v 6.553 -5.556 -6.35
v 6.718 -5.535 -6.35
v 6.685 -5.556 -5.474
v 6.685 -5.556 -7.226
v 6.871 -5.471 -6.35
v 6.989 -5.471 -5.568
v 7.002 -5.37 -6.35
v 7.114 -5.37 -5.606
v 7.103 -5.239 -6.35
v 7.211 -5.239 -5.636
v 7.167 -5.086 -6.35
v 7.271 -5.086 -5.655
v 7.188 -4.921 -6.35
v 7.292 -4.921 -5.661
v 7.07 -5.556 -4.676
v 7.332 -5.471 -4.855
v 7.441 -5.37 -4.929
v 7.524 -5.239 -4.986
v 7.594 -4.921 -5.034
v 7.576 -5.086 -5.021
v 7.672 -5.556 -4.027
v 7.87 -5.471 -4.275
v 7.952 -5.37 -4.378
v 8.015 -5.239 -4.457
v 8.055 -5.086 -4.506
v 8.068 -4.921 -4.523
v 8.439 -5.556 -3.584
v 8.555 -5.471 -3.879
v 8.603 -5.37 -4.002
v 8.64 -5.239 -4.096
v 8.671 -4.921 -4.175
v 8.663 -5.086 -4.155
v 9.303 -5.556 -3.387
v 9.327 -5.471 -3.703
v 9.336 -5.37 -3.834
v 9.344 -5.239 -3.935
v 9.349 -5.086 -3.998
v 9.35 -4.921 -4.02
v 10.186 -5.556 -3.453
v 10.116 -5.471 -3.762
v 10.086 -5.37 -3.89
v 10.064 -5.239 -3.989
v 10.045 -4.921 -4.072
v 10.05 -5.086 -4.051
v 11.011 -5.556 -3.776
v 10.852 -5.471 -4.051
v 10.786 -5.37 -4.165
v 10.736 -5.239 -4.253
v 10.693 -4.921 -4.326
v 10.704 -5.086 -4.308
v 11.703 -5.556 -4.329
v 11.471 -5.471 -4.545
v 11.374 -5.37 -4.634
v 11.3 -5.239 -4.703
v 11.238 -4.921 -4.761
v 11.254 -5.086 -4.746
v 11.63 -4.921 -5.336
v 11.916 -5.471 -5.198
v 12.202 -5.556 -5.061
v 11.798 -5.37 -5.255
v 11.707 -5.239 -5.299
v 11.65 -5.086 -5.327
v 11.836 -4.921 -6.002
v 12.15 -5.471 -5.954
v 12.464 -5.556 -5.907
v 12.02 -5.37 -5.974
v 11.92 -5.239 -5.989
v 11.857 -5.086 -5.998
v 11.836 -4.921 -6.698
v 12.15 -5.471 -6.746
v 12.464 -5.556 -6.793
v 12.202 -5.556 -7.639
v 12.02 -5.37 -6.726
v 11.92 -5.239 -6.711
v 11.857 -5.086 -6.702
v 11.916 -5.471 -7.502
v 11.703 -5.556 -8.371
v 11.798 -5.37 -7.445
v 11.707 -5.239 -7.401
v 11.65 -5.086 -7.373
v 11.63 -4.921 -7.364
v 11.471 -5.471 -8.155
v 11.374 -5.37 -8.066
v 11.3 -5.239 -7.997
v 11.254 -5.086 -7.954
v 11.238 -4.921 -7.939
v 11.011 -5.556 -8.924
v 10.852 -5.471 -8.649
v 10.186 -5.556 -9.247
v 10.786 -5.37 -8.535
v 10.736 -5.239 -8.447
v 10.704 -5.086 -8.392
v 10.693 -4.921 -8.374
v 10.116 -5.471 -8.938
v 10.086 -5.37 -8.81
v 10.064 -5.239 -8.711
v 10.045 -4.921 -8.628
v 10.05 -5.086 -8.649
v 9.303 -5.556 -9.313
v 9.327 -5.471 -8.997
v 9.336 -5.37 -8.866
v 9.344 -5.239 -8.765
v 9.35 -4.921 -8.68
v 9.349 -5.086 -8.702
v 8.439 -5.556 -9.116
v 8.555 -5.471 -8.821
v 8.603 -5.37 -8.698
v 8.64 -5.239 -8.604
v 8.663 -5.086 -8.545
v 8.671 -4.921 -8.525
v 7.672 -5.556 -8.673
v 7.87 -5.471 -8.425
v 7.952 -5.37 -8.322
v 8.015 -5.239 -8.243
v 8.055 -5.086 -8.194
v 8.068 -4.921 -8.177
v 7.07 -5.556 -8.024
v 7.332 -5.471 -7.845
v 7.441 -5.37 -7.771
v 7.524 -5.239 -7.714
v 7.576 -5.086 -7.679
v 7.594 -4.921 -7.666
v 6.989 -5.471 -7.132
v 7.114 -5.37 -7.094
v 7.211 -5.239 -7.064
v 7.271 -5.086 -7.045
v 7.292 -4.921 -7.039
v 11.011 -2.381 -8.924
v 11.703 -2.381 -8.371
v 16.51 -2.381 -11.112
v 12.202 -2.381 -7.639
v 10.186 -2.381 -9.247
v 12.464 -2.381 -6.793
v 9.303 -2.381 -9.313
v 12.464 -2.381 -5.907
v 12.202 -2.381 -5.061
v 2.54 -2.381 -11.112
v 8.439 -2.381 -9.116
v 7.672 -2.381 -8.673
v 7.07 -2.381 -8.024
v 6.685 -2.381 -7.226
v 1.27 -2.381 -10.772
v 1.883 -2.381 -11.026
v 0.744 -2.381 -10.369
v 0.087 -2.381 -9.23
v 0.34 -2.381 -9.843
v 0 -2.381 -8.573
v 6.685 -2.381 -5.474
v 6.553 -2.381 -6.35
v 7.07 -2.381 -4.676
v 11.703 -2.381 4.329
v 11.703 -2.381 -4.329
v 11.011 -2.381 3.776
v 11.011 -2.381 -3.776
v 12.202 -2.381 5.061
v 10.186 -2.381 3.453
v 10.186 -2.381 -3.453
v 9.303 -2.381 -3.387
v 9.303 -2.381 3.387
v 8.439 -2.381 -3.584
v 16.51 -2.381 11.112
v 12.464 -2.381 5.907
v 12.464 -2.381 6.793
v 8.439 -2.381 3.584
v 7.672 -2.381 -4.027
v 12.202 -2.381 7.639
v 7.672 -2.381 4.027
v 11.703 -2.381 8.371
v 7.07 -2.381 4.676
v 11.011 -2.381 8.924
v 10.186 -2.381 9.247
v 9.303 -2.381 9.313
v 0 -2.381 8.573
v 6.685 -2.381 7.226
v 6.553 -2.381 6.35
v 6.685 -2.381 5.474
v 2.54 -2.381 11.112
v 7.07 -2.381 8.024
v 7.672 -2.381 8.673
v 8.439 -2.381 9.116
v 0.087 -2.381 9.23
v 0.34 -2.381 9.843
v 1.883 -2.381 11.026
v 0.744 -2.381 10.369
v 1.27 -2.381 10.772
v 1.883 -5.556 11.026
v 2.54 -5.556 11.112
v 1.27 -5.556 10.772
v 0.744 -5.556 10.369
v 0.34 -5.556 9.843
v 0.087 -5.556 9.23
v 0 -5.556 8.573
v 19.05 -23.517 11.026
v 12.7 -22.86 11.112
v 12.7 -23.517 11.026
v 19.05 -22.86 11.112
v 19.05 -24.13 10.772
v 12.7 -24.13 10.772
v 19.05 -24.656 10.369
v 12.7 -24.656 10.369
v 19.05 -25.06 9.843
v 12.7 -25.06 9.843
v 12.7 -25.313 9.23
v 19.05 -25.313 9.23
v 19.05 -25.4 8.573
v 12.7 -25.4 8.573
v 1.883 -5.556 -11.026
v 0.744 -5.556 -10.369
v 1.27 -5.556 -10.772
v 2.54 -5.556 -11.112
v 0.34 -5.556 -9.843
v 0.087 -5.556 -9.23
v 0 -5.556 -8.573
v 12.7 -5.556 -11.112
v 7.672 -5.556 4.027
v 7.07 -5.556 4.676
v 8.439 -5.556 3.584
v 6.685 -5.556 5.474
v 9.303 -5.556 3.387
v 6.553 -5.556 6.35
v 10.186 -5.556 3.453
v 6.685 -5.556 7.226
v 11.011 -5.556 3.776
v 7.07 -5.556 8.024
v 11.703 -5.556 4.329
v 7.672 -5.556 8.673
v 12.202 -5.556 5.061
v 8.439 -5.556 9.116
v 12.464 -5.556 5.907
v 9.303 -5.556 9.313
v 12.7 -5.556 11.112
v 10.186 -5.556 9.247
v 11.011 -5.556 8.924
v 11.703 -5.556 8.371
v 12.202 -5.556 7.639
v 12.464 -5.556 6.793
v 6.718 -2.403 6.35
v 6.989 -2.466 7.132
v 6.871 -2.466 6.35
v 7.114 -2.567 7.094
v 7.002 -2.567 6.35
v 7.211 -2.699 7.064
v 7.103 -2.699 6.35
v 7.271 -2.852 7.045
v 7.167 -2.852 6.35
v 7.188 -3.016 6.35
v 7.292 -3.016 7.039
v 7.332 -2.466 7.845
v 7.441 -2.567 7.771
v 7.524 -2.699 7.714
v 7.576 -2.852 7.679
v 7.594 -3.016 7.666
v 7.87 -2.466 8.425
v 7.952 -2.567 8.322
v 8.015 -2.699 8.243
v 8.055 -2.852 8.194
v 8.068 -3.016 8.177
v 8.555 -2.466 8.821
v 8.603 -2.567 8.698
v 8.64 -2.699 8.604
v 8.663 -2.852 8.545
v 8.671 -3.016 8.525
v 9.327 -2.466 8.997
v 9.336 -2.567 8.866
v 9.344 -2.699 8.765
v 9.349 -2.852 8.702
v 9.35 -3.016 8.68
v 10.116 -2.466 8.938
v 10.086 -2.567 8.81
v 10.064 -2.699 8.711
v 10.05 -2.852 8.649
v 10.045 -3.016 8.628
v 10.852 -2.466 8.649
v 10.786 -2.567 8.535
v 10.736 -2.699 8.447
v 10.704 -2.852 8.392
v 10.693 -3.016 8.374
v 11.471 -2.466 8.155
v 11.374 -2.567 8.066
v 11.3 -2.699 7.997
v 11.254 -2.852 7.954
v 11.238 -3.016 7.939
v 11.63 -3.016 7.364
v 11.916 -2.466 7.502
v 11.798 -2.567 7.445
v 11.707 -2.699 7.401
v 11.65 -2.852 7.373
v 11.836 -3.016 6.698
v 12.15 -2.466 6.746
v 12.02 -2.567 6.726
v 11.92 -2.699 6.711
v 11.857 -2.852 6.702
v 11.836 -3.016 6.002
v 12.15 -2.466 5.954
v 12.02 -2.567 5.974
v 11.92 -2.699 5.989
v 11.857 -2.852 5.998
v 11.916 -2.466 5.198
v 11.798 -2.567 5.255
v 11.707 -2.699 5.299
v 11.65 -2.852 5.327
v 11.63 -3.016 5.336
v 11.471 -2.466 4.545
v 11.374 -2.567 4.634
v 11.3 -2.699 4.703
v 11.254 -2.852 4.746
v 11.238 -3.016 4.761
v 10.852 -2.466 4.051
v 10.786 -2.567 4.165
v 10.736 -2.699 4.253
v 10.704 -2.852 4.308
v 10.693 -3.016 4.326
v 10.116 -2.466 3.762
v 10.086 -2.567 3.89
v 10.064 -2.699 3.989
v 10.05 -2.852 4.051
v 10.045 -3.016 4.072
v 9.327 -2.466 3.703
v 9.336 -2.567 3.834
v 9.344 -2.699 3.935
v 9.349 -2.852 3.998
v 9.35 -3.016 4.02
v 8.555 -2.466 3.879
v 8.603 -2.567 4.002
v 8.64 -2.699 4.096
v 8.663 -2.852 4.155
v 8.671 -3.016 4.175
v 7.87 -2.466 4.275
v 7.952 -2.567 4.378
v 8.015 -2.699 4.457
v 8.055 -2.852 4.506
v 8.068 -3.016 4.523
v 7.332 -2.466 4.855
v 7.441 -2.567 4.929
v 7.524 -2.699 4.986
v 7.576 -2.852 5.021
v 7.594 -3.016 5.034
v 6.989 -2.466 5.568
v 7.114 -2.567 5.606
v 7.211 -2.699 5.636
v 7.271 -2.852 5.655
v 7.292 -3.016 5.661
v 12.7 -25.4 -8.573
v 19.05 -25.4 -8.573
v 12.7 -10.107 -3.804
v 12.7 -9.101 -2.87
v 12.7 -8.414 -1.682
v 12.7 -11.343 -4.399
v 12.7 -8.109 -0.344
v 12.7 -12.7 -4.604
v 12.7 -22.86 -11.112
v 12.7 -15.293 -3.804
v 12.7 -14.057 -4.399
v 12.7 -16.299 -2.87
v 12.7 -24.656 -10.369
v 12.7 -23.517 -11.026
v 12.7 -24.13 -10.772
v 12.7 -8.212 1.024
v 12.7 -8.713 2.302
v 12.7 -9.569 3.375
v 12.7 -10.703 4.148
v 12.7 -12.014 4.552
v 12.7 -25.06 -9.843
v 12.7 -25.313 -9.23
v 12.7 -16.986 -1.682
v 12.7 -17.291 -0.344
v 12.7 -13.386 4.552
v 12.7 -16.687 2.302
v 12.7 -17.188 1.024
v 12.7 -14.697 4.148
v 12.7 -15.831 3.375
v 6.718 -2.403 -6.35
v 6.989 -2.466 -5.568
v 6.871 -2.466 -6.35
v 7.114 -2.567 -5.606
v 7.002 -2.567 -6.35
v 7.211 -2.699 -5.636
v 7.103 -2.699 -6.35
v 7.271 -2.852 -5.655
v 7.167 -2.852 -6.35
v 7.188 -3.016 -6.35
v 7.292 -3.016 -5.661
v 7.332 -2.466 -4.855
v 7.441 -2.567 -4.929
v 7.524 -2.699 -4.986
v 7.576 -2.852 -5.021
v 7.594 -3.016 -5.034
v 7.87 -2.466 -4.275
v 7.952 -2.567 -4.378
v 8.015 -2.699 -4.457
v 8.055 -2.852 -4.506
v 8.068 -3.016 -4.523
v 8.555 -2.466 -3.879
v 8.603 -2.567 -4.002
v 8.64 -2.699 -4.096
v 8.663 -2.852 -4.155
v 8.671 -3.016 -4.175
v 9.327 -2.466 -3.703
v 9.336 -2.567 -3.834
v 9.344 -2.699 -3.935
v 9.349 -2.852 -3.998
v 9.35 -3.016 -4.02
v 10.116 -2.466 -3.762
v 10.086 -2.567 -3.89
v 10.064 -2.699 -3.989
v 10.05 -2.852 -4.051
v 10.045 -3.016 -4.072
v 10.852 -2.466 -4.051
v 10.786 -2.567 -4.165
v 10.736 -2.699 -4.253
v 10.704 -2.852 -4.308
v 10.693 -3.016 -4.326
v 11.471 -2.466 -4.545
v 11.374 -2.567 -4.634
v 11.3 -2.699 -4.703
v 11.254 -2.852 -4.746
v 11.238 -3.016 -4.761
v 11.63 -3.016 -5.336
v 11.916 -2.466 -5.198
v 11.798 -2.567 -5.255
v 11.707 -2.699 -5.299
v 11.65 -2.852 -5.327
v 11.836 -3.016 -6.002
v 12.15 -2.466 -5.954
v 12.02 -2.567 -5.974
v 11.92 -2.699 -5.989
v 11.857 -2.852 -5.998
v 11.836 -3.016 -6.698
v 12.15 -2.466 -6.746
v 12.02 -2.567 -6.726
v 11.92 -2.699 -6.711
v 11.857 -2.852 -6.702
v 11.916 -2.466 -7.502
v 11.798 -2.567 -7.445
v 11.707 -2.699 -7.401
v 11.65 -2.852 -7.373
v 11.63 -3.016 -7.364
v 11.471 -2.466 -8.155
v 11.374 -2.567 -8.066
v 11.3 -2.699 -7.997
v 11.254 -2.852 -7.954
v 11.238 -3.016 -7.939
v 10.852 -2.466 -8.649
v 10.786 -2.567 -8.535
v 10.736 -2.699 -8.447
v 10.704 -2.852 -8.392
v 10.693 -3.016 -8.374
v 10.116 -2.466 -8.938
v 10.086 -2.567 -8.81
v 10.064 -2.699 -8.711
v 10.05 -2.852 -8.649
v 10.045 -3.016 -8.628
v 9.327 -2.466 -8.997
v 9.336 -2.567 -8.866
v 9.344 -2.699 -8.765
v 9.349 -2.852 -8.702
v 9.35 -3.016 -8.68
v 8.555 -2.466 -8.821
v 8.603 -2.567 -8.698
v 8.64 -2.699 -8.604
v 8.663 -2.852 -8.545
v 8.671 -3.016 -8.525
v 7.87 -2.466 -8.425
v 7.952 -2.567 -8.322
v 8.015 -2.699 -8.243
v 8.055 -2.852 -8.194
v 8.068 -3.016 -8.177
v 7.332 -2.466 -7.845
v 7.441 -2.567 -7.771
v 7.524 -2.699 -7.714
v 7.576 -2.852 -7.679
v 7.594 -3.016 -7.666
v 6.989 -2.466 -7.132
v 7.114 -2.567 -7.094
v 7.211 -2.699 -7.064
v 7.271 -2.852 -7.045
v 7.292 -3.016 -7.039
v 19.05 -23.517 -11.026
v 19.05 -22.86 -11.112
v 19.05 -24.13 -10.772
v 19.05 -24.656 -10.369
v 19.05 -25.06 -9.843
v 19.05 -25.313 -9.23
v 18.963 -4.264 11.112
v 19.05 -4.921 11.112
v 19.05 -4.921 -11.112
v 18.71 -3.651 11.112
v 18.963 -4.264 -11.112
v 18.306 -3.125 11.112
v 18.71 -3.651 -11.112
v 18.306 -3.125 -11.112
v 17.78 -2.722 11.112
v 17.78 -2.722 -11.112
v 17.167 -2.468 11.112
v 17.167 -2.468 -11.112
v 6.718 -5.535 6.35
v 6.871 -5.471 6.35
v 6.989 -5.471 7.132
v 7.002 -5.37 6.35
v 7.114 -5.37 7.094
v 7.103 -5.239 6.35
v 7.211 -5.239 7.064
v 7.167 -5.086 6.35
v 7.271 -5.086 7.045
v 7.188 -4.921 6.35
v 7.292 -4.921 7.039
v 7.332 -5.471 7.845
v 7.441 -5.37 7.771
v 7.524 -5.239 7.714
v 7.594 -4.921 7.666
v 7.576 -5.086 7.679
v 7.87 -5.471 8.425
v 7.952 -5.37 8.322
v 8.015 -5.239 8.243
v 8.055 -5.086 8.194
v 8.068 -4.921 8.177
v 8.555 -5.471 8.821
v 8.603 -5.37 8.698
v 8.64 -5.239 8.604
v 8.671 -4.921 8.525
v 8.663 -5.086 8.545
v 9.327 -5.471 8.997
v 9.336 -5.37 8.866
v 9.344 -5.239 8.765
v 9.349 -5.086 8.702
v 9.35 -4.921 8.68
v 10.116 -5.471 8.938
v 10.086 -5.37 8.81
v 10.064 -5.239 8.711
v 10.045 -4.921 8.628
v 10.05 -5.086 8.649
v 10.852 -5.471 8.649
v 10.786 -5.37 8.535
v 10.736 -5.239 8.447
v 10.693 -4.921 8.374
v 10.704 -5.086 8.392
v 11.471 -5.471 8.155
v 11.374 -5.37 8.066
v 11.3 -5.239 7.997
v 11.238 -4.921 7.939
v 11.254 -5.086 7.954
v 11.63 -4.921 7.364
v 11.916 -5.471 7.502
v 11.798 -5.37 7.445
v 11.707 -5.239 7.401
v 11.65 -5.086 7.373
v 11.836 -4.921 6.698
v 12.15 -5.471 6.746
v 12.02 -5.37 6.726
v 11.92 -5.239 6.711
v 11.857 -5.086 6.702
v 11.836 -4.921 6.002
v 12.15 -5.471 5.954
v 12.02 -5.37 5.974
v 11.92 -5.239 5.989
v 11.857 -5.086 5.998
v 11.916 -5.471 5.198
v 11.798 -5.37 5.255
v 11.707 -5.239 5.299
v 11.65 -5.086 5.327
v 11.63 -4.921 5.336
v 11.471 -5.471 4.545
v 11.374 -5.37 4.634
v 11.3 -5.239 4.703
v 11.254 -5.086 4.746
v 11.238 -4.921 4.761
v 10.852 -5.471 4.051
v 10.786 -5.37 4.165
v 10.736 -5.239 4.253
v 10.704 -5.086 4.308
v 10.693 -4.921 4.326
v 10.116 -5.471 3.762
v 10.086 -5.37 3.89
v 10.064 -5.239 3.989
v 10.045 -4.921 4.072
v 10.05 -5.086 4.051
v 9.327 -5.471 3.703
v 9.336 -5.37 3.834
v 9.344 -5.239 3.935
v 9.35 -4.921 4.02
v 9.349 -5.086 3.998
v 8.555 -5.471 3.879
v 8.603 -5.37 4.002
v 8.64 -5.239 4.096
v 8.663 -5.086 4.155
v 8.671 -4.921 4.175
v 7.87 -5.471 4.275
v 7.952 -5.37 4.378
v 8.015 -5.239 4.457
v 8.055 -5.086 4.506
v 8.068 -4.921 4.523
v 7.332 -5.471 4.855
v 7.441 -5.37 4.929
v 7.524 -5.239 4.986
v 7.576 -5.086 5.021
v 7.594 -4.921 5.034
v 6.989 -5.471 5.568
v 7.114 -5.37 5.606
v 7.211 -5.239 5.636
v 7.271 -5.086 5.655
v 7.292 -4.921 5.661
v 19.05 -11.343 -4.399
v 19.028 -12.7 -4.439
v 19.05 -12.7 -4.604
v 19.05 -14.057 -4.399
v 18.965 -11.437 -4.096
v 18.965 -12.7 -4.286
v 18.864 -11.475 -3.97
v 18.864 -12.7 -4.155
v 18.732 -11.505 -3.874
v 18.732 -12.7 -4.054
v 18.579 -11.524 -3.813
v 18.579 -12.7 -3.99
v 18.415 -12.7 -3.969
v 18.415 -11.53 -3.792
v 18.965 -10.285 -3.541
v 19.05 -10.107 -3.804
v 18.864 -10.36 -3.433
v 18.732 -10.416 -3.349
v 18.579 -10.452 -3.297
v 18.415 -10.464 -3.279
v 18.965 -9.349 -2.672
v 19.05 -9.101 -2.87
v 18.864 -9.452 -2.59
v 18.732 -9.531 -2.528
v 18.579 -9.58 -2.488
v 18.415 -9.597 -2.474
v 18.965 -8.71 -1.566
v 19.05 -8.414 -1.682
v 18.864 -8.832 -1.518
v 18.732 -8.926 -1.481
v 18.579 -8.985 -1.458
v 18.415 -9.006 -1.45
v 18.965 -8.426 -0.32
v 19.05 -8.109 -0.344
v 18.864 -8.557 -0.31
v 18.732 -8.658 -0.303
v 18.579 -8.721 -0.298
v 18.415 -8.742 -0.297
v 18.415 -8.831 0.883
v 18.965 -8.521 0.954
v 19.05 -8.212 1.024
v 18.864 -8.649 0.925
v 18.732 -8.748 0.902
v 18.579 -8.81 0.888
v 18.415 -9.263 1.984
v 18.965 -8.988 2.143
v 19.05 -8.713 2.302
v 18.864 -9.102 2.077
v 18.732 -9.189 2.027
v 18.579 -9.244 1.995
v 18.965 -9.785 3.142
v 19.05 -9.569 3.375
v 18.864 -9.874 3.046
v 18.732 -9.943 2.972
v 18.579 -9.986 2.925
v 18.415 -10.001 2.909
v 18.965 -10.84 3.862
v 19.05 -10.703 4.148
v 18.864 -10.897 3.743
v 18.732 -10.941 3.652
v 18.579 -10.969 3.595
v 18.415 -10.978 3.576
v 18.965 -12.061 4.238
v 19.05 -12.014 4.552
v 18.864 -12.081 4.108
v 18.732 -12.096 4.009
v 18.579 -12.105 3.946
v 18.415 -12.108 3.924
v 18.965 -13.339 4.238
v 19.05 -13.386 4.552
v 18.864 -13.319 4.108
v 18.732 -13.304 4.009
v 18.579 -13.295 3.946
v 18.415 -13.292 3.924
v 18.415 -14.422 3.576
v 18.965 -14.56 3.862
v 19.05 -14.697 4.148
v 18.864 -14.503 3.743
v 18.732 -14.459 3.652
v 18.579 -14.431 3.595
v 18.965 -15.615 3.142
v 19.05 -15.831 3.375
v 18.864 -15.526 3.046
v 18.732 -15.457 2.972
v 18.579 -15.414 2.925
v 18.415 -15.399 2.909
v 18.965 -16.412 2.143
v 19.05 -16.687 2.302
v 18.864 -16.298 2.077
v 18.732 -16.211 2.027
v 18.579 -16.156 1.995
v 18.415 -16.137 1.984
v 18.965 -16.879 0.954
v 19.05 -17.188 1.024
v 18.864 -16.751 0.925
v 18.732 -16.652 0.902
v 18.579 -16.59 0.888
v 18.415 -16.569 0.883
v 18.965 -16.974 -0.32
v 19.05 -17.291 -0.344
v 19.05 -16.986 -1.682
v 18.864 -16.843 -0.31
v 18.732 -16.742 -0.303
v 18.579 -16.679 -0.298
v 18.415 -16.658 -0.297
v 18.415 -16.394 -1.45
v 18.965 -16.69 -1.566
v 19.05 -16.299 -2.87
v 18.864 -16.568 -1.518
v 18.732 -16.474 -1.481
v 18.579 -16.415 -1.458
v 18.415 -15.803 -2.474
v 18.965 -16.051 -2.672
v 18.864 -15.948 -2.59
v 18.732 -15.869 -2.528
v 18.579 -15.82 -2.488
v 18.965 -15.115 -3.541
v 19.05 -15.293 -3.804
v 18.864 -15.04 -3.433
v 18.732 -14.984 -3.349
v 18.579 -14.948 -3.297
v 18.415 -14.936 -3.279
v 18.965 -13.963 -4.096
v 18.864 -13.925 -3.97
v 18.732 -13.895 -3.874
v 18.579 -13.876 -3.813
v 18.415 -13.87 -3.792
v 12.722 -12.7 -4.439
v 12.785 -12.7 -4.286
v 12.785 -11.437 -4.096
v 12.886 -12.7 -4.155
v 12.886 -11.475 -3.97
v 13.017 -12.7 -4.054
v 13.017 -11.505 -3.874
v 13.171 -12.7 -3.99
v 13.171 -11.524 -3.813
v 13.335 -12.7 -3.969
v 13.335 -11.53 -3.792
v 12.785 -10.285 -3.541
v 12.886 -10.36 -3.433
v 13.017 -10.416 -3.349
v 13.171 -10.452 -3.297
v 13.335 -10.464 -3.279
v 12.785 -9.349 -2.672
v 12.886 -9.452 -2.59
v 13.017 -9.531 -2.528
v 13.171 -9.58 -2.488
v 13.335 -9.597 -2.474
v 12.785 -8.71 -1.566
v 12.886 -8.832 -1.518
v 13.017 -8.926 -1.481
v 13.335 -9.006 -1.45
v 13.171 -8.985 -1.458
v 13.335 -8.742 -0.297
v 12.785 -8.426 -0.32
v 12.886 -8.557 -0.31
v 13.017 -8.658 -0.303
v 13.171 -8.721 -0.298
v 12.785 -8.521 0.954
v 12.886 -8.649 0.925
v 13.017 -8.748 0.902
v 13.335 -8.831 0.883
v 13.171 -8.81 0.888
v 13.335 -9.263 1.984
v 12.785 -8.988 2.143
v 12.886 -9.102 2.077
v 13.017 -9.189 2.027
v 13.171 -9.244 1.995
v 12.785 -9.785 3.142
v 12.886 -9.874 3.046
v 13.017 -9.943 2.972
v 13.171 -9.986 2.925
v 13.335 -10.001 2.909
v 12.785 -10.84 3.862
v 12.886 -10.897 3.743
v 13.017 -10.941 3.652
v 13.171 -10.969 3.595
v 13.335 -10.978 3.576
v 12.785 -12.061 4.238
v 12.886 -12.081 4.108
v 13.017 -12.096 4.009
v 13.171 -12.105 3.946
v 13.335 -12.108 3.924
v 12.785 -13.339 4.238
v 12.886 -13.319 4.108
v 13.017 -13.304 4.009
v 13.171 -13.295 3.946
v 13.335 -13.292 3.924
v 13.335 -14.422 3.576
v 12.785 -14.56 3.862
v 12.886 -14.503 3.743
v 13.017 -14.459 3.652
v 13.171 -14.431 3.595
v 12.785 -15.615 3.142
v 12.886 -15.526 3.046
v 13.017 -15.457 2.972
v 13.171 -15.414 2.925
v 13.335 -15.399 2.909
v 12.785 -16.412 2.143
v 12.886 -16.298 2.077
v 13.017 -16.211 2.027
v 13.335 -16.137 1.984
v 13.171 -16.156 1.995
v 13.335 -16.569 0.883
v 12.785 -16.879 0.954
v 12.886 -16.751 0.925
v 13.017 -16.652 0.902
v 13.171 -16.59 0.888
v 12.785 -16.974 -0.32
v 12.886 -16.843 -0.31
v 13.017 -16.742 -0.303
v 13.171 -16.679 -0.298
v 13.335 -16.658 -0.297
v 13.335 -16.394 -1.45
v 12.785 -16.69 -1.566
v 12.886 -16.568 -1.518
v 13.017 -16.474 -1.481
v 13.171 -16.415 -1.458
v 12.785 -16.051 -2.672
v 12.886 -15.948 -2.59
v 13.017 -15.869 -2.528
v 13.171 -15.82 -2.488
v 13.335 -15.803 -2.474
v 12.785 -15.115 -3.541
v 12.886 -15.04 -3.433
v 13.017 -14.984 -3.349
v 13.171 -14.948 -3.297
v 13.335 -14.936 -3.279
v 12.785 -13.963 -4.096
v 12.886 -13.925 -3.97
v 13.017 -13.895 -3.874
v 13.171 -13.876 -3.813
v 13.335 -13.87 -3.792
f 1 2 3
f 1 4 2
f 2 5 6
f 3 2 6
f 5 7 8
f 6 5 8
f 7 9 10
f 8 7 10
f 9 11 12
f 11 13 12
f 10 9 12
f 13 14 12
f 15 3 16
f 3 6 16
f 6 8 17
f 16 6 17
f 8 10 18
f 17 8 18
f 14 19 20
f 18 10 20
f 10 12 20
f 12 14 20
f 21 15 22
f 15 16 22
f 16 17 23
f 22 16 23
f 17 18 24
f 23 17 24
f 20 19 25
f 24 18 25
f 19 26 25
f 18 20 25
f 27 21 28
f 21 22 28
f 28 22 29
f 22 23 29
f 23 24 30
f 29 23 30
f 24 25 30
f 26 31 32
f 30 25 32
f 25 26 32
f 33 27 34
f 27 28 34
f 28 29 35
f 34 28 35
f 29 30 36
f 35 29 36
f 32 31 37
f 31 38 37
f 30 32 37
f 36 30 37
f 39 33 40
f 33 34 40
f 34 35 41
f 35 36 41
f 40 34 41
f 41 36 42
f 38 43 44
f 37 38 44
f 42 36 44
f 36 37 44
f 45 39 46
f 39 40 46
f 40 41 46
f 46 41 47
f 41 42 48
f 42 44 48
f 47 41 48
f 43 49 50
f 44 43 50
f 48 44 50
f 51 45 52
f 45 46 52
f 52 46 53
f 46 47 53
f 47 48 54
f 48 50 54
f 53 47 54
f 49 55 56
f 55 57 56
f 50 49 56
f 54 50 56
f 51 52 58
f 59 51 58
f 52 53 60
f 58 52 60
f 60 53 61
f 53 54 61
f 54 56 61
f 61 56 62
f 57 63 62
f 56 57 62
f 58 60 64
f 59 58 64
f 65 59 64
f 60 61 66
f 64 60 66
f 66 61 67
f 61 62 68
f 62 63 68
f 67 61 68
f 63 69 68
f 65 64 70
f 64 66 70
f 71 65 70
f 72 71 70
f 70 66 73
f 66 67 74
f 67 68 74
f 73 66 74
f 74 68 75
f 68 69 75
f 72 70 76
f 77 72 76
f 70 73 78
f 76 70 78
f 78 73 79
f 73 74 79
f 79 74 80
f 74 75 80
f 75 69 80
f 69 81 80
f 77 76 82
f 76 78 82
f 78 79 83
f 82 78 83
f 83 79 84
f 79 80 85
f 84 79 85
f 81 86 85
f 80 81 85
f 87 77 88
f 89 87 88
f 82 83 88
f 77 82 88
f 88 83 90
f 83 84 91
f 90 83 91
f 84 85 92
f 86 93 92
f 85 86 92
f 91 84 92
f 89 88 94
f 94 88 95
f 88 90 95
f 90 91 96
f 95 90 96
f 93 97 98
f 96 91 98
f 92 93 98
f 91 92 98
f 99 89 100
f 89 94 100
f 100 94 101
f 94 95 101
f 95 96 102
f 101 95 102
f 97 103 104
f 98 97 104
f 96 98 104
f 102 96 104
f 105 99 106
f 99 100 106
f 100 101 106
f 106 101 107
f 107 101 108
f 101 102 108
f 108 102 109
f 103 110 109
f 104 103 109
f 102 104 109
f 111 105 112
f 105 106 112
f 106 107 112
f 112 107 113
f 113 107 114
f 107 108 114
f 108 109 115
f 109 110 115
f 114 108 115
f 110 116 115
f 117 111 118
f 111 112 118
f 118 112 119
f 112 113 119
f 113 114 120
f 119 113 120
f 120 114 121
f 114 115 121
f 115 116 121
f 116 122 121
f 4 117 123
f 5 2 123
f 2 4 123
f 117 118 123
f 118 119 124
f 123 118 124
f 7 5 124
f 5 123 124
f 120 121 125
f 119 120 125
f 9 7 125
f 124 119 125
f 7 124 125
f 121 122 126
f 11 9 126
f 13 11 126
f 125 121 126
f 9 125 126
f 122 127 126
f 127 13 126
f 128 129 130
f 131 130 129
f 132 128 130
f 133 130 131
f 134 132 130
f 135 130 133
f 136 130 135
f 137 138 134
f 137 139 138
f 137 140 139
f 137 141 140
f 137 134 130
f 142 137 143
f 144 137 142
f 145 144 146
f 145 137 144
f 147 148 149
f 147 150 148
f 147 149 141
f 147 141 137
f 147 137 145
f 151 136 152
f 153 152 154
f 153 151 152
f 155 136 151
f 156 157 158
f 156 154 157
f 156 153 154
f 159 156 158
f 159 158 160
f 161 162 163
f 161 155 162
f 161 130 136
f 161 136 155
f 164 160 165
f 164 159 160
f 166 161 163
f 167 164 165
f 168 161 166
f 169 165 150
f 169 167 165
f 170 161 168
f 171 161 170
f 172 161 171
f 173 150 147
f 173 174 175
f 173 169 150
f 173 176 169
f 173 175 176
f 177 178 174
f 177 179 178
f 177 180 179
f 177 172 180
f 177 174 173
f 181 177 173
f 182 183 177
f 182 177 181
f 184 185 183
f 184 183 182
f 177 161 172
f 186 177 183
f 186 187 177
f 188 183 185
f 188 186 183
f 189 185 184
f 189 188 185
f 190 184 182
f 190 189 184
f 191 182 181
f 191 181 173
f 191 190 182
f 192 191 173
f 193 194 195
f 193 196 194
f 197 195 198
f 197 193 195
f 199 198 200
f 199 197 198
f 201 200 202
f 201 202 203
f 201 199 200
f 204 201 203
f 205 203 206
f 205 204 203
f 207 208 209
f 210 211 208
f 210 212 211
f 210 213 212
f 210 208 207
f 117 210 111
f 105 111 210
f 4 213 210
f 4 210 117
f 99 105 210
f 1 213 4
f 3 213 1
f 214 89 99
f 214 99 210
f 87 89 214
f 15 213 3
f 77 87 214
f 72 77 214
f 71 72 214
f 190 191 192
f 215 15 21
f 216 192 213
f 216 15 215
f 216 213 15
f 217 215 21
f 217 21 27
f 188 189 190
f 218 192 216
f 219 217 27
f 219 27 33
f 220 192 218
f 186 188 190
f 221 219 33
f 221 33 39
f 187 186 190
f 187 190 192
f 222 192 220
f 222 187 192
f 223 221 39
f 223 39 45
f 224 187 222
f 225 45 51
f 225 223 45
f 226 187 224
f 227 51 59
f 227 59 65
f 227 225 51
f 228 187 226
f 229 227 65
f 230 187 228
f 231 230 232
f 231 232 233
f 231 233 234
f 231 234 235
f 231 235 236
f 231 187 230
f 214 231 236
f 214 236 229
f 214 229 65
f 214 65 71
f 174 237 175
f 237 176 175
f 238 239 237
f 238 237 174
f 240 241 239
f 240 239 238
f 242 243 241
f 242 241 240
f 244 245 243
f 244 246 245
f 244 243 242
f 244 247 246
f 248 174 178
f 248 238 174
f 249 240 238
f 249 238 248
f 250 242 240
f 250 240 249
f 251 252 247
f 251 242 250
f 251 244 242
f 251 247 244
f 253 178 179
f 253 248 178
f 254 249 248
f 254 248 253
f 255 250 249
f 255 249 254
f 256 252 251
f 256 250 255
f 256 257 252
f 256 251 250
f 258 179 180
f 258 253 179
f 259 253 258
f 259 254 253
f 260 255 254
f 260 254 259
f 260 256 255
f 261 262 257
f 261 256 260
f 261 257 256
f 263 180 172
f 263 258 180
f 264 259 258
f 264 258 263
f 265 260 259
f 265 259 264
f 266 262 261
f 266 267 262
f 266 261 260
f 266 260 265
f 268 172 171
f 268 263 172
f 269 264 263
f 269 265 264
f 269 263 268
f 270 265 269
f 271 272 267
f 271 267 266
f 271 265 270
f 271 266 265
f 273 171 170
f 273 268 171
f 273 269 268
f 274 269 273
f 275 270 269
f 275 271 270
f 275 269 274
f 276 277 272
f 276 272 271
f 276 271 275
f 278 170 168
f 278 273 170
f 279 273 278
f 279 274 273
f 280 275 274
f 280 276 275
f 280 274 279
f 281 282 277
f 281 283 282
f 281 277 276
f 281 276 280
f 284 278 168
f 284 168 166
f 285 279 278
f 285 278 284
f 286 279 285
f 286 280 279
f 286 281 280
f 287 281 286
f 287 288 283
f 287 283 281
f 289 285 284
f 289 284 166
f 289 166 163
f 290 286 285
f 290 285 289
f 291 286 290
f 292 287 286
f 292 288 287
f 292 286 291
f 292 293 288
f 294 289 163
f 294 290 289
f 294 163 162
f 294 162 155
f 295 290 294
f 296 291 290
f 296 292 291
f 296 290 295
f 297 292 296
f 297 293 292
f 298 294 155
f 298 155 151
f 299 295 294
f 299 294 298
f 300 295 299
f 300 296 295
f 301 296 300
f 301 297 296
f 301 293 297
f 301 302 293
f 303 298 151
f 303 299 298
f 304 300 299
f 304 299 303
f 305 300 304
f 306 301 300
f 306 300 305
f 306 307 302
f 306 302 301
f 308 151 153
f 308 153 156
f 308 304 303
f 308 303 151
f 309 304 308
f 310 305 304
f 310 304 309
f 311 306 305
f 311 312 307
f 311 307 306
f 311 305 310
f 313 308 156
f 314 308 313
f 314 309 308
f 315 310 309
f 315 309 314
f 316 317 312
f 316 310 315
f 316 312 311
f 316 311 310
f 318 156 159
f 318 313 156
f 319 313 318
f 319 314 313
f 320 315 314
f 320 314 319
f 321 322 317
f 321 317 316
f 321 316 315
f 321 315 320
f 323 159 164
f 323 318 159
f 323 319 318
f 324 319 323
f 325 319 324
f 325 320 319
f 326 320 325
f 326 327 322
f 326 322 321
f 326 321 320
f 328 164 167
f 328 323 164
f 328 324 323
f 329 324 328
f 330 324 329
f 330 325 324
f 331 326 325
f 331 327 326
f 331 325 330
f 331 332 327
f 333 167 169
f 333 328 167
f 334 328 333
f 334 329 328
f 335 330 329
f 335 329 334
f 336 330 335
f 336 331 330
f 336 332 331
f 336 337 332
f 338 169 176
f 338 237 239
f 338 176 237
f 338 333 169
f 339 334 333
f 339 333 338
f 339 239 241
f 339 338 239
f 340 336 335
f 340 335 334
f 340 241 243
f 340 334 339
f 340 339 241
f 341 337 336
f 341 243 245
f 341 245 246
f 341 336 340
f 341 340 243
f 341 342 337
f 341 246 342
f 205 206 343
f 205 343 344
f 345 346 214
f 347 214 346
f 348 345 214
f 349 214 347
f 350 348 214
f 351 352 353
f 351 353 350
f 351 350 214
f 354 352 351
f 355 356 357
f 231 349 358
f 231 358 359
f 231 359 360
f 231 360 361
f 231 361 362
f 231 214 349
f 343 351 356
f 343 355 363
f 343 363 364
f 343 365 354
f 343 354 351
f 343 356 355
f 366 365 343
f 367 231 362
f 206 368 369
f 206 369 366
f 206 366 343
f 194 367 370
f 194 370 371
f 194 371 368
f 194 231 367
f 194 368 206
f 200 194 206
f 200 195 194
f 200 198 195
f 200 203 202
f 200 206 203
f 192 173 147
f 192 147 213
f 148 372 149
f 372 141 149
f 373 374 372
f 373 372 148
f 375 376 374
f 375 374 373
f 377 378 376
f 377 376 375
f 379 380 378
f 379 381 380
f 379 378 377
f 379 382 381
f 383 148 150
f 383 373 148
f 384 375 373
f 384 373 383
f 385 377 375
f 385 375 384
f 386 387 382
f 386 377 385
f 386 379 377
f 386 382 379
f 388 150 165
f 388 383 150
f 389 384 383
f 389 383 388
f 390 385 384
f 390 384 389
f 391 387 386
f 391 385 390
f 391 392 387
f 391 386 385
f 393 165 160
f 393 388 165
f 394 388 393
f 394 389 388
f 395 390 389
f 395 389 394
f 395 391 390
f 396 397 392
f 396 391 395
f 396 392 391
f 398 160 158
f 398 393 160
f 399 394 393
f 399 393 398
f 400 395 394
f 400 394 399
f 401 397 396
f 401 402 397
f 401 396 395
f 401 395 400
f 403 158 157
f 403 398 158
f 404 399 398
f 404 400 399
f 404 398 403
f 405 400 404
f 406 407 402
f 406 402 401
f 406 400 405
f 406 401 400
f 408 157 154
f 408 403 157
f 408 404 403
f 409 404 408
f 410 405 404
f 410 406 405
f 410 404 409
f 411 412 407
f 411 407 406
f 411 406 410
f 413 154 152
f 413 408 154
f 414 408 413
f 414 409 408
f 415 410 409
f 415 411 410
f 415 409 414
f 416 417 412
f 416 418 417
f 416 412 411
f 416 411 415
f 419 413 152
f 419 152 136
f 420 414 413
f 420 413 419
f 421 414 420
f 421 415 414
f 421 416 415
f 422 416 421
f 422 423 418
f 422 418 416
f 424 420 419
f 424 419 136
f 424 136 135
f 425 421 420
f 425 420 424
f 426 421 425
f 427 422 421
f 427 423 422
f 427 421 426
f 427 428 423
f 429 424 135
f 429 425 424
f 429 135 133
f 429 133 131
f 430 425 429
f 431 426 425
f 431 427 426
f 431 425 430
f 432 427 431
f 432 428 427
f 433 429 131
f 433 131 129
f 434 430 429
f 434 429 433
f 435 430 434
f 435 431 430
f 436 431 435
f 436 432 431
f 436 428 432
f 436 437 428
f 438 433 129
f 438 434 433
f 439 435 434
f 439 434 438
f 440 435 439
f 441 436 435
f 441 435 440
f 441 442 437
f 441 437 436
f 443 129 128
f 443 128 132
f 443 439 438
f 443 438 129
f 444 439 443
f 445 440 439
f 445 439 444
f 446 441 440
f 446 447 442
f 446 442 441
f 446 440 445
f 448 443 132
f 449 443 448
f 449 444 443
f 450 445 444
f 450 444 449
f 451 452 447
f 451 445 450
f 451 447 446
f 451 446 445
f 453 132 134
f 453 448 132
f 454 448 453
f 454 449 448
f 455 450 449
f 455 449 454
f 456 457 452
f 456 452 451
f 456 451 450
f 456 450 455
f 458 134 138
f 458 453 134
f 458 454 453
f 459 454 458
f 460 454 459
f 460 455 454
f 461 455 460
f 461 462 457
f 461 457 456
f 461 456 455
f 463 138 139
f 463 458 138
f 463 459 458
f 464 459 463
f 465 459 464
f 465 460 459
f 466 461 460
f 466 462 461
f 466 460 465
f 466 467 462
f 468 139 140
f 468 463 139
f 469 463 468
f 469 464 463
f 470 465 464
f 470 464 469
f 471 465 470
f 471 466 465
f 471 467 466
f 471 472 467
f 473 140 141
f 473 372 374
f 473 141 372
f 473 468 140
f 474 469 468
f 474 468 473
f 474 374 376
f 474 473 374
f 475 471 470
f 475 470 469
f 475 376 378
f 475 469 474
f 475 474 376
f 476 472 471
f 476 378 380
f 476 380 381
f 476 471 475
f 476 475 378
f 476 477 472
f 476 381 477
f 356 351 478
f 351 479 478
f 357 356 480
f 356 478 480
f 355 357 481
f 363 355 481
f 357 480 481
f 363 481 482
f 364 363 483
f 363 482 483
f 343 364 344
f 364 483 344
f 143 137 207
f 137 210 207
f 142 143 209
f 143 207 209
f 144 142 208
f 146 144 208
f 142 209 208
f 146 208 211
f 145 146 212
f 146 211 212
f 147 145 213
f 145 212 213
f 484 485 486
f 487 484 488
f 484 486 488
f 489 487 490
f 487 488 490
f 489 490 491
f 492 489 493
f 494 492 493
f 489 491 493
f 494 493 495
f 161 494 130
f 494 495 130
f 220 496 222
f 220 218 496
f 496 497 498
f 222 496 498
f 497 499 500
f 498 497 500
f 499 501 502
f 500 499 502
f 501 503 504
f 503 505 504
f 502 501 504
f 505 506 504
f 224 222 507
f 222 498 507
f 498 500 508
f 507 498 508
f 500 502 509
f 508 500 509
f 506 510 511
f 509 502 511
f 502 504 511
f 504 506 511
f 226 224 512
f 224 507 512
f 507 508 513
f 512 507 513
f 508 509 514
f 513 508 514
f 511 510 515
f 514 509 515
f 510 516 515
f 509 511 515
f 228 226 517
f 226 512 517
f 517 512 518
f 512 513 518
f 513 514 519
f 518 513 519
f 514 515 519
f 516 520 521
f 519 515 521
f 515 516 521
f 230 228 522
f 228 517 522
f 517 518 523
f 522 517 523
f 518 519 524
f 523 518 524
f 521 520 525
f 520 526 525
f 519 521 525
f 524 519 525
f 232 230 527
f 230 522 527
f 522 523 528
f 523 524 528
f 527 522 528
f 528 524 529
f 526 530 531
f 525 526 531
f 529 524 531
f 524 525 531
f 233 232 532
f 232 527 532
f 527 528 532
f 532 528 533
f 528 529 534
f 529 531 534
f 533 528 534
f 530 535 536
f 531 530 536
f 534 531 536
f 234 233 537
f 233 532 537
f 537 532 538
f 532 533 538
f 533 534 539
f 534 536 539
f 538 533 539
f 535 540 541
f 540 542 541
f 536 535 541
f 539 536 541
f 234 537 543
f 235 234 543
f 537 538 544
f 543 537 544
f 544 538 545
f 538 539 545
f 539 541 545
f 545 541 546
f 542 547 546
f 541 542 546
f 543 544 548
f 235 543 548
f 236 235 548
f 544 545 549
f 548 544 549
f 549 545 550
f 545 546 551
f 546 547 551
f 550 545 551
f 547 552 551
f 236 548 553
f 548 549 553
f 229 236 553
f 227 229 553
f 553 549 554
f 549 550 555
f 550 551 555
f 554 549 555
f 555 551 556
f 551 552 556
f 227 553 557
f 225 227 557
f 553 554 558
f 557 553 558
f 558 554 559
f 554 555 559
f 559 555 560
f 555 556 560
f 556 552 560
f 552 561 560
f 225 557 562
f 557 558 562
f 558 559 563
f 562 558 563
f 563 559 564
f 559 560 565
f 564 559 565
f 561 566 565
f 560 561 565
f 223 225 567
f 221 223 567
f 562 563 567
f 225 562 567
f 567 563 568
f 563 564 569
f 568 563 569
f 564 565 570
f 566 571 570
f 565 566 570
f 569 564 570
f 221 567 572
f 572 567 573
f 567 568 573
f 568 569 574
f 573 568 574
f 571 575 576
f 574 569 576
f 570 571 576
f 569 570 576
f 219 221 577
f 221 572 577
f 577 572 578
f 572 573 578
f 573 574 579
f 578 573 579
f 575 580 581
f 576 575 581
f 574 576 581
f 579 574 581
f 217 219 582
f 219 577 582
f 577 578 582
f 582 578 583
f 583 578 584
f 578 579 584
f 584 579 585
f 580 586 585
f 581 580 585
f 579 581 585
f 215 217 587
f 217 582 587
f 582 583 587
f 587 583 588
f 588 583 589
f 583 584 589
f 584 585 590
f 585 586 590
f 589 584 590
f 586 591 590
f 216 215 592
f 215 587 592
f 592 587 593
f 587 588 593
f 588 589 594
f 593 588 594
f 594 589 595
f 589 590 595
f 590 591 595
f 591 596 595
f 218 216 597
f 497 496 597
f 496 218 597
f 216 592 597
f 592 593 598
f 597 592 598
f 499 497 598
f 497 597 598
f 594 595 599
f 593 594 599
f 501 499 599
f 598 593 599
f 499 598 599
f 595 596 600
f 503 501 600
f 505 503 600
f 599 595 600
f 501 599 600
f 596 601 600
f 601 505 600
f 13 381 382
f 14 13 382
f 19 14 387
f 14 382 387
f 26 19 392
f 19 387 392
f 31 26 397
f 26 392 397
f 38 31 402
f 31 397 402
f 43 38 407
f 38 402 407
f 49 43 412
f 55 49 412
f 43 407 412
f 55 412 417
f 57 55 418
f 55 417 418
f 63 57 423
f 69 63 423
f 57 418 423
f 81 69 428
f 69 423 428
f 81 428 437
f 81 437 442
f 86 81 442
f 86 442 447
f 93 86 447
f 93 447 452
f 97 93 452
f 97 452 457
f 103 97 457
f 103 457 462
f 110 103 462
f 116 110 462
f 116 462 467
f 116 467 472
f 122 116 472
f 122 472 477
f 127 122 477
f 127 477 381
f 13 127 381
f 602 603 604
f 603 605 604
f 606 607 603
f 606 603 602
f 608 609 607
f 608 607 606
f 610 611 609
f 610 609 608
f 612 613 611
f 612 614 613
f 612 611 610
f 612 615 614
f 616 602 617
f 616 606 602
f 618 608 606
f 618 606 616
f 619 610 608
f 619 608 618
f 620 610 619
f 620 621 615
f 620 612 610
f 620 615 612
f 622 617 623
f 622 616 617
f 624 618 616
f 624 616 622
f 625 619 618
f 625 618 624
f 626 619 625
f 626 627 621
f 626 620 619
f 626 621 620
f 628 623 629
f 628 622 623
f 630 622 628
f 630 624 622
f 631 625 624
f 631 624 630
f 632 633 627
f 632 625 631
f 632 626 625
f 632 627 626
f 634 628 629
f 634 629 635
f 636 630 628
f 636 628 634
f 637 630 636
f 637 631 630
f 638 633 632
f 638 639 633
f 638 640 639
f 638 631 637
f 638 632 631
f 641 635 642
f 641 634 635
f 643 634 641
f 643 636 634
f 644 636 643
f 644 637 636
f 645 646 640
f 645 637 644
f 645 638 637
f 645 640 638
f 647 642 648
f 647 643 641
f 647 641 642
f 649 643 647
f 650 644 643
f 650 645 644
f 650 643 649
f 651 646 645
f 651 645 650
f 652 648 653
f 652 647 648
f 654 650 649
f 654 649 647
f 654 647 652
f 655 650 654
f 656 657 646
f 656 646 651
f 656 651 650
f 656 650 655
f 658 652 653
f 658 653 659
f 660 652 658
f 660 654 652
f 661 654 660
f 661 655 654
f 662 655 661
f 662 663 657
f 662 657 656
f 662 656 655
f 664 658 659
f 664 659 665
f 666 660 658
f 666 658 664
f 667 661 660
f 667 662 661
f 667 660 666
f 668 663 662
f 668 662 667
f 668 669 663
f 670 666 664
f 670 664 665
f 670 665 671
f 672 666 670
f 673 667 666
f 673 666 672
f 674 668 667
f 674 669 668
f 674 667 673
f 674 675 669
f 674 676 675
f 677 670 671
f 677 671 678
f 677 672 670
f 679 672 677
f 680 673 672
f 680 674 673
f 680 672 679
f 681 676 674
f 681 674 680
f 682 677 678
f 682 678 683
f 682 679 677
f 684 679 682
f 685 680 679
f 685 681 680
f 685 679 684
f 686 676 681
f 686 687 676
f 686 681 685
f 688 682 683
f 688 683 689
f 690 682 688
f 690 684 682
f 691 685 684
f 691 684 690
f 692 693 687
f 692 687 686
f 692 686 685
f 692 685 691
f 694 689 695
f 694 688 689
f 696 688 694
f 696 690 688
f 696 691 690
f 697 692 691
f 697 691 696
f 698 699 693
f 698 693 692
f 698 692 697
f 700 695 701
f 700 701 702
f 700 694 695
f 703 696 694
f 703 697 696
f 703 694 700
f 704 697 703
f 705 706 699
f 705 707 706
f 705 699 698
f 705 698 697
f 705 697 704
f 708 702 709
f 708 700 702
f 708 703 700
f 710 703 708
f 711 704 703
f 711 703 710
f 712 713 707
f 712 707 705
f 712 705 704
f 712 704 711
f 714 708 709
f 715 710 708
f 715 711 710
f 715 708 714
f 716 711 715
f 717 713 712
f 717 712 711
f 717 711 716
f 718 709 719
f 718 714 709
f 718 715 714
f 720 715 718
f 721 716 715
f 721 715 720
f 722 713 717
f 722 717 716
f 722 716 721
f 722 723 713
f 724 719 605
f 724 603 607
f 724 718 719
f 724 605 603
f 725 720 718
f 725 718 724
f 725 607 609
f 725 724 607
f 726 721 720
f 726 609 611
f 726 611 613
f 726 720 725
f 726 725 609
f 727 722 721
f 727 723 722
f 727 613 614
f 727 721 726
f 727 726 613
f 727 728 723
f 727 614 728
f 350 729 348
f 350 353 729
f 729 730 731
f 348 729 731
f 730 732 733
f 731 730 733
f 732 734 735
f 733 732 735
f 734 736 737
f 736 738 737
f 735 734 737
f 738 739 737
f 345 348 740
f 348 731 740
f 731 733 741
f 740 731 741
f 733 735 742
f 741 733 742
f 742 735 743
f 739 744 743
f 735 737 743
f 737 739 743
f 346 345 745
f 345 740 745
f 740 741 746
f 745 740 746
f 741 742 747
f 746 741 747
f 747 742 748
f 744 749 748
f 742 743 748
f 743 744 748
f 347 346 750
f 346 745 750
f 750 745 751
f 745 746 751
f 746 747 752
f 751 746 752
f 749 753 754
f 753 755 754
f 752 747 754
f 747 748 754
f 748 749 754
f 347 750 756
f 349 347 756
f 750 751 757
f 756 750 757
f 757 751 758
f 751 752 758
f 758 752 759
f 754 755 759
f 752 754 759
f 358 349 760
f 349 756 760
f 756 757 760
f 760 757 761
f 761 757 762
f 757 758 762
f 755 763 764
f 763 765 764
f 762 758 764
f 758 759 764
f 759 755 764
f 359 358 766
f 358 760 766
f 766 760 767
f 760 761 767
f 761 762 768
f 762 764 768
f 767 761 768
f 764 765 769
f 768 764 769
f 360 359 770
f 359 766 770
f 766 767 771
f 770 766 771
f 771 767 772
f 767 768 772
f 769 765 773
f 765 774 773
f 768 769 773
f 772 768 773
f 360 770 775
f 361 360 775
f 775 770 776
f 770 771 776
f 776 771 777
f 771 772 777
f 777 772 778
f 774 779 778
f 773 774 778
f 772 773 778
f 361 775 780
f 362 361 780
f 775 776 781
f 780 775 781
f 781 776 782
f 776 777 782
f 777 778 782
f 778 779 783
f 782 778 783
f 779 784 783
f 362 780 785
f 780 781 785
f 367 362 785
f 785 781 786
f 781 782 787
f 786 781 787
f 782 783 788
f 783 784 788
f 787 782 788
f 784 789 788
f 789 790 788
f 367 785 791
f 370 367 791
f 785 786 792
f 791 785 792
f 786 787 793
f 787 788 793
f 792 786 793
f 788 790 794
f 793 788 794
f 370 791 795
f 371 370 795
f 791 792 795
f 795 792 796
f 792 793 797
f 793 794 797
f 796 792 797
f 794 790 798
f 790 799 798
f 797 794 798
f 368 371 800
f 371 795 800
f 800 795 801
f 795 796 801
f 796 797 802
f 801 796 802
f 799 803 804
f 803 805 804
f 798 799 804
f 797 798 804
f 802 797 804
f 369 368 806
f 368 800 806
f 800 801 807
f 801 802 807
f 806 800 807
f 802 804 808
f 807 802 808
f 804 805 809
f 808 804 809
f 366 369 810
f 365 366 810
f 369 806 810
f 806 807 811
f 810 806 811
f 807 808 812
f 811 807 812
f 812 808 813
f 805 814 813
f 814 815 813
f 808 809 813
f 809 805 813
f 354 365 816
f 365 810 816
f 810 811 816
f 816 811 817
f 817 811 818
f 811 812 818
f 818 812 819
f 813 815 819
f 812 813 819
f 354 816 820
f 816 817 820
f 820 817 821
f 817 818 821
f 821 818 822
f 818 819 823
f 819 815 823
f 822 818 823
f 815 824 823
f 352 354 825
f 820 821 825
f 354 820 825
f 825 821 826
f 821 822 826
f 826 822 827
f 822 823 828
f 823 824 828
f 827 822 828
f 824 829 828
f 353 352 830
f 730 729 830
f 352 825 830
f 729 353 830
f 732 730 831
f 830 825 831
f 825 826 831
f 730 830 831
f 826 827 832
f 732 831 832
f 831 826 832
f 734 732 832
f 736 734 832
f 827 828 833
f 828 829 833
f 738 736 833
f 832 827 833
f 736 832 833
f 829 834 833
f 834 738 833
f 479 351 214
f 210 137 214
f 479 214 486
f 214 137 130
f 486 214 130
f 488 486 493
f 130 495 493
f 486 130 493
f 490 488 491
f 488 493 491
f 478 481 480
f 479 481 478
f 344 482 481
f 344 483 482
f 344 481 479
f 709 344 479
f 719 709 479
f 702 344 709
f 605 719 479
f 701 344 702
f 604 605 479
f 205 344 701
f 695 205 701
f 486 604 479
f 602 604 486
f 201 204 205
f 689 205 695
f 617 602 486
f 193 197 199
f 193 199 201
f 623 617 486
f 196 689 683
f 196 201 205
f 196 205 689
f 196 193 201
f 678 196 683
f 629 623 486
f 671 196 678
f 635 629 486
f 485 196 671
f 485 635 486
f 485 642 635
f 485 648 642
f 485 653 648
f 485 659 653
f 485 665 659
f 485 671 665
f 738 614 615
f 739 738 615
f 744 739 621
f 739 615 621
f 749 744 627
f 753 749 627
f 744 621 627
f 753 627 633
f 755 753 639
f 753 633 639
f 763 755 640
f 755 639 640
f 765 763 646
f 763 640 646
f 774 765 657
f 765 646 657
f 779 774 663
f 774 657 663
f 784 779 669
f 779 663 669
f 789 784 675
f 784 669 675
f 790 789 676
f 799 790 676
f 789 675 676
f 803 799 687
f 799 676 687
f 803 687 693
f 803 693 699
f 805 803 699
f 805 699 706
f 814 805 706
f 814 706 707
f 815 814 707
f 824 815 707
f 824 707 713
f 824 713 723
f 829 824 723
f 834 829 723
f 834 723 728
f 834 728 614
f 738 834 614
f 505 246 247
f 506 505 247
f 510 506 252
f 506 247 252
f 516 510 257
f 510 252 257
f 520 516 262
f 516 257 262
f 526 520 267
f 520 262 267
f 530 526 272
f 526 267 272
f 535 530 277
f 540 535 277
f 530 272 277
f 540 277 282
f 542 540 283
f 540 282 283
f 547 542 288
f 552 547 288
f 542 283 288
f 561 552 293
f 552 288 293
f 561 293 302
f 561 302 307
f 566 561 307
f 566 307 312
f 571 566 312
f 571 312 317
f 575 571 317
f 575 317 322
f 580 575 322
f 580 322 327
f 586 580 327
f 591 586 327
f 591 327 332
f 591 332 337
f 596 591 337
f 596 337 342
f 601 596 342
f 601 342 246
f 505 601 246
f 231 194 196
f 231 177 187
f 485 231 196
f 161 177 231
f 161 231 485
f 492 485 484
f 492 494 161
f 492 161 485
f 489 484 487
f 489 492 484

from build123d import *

# Parameters (mm, degrees)
BOSS_EXTRUDE1_DEPTH = 11.1125
SKETCH2_R           = 3.96875
CUT_EXTRUDE1_DEPTH  = 22.225
FILLET1_R           = 0.635
FILLET2_R           = 2.54
SKETCH3_R           = 2.3368
CUT_EXTRUDE2_DEPTH  = 22.225
FILLET3_R           = 0.635


with BuildPart() as part:
    # Sketch1 → Boss-Extrude1 (new, symmetric)
    with BuildSketch(Plane.XY):
        Polygon((0, -2.38125), (0, -5.55625), (12.7, -5.55625), (12.7, -25.4), (19.05, -25.4), (19.05, -2.38125), align=None)
    extrude(amount=BOSS_EXTRUDE1_DEPTH, both=True)

    # Sketch2 → Cut-Extrude1 (cut)
    with BuildSketch(Plane(origin=(19.05, 0, 0), x_dir=(0, 0, -1), z_dir=(1, 0, 0))):
        with Locations((0, -12.7)):
            Circle(SKETCH2_R)
    extrude(amount=-CUT_EXTRUDE1_DEPTH, mode=Mode.SUBTRACT)

    # Fillet1
    fillet1_edges = [part.edges().sort_by_distance(p)[0] for p in [
        (12.7, -12.7, 3.96875),
        (19.05, -12.7, 3.96875),
    ]]
    fillet(fillet1_edges, radius=FILLET1_R)

    # Fillet2
    fillet2_edges = [part.edges().sort_by_distance(p)[0] for p in [
        (19.05, -2.38125, 0),
        (15.875, -25.4, 11.1125),
        (15.875, -25.4, -11.1125),
        (0, -3.96875, -11.1125),
        (0, -3.96875, 11.1125),
    ]]
    fillet(fillet2_edges, radius=FILLET2_R)

    # Sketch3 → Cut-Extrude2 (cut)
    with BuildSketch(Plane(origin=(0, -2.38125, 0), x_dir=(1, 0, 0), z_dir=(0, 1, 0))):
        with Locations(Location((9.525, 6.35, 0), (0, 0, 180))):
            Circle(SKETCH3_R)
        with Locations(Location((9.525, -6.35, 0), (0, 0, 180))):
            Circle(SKETCH3_R)
    extrude(amount=-CUT_EXTRUDE2_DEPTH, mode=Mode.SUBTRACT)

    # Fillet3
    fillet3_edges = [part.edges().sort_by_distance(p)[0] for p in [
        (11.8618, -5.55625, -6.35),
        (11.8618, -2.38125, -6.35),
        (11.8618, -5.55625, 6.35),
        (11.8618, -2.38125, 6.35),
    ]]
    fillet(fillet3_edges, radius=FILLET3_R)


solid = part.part
